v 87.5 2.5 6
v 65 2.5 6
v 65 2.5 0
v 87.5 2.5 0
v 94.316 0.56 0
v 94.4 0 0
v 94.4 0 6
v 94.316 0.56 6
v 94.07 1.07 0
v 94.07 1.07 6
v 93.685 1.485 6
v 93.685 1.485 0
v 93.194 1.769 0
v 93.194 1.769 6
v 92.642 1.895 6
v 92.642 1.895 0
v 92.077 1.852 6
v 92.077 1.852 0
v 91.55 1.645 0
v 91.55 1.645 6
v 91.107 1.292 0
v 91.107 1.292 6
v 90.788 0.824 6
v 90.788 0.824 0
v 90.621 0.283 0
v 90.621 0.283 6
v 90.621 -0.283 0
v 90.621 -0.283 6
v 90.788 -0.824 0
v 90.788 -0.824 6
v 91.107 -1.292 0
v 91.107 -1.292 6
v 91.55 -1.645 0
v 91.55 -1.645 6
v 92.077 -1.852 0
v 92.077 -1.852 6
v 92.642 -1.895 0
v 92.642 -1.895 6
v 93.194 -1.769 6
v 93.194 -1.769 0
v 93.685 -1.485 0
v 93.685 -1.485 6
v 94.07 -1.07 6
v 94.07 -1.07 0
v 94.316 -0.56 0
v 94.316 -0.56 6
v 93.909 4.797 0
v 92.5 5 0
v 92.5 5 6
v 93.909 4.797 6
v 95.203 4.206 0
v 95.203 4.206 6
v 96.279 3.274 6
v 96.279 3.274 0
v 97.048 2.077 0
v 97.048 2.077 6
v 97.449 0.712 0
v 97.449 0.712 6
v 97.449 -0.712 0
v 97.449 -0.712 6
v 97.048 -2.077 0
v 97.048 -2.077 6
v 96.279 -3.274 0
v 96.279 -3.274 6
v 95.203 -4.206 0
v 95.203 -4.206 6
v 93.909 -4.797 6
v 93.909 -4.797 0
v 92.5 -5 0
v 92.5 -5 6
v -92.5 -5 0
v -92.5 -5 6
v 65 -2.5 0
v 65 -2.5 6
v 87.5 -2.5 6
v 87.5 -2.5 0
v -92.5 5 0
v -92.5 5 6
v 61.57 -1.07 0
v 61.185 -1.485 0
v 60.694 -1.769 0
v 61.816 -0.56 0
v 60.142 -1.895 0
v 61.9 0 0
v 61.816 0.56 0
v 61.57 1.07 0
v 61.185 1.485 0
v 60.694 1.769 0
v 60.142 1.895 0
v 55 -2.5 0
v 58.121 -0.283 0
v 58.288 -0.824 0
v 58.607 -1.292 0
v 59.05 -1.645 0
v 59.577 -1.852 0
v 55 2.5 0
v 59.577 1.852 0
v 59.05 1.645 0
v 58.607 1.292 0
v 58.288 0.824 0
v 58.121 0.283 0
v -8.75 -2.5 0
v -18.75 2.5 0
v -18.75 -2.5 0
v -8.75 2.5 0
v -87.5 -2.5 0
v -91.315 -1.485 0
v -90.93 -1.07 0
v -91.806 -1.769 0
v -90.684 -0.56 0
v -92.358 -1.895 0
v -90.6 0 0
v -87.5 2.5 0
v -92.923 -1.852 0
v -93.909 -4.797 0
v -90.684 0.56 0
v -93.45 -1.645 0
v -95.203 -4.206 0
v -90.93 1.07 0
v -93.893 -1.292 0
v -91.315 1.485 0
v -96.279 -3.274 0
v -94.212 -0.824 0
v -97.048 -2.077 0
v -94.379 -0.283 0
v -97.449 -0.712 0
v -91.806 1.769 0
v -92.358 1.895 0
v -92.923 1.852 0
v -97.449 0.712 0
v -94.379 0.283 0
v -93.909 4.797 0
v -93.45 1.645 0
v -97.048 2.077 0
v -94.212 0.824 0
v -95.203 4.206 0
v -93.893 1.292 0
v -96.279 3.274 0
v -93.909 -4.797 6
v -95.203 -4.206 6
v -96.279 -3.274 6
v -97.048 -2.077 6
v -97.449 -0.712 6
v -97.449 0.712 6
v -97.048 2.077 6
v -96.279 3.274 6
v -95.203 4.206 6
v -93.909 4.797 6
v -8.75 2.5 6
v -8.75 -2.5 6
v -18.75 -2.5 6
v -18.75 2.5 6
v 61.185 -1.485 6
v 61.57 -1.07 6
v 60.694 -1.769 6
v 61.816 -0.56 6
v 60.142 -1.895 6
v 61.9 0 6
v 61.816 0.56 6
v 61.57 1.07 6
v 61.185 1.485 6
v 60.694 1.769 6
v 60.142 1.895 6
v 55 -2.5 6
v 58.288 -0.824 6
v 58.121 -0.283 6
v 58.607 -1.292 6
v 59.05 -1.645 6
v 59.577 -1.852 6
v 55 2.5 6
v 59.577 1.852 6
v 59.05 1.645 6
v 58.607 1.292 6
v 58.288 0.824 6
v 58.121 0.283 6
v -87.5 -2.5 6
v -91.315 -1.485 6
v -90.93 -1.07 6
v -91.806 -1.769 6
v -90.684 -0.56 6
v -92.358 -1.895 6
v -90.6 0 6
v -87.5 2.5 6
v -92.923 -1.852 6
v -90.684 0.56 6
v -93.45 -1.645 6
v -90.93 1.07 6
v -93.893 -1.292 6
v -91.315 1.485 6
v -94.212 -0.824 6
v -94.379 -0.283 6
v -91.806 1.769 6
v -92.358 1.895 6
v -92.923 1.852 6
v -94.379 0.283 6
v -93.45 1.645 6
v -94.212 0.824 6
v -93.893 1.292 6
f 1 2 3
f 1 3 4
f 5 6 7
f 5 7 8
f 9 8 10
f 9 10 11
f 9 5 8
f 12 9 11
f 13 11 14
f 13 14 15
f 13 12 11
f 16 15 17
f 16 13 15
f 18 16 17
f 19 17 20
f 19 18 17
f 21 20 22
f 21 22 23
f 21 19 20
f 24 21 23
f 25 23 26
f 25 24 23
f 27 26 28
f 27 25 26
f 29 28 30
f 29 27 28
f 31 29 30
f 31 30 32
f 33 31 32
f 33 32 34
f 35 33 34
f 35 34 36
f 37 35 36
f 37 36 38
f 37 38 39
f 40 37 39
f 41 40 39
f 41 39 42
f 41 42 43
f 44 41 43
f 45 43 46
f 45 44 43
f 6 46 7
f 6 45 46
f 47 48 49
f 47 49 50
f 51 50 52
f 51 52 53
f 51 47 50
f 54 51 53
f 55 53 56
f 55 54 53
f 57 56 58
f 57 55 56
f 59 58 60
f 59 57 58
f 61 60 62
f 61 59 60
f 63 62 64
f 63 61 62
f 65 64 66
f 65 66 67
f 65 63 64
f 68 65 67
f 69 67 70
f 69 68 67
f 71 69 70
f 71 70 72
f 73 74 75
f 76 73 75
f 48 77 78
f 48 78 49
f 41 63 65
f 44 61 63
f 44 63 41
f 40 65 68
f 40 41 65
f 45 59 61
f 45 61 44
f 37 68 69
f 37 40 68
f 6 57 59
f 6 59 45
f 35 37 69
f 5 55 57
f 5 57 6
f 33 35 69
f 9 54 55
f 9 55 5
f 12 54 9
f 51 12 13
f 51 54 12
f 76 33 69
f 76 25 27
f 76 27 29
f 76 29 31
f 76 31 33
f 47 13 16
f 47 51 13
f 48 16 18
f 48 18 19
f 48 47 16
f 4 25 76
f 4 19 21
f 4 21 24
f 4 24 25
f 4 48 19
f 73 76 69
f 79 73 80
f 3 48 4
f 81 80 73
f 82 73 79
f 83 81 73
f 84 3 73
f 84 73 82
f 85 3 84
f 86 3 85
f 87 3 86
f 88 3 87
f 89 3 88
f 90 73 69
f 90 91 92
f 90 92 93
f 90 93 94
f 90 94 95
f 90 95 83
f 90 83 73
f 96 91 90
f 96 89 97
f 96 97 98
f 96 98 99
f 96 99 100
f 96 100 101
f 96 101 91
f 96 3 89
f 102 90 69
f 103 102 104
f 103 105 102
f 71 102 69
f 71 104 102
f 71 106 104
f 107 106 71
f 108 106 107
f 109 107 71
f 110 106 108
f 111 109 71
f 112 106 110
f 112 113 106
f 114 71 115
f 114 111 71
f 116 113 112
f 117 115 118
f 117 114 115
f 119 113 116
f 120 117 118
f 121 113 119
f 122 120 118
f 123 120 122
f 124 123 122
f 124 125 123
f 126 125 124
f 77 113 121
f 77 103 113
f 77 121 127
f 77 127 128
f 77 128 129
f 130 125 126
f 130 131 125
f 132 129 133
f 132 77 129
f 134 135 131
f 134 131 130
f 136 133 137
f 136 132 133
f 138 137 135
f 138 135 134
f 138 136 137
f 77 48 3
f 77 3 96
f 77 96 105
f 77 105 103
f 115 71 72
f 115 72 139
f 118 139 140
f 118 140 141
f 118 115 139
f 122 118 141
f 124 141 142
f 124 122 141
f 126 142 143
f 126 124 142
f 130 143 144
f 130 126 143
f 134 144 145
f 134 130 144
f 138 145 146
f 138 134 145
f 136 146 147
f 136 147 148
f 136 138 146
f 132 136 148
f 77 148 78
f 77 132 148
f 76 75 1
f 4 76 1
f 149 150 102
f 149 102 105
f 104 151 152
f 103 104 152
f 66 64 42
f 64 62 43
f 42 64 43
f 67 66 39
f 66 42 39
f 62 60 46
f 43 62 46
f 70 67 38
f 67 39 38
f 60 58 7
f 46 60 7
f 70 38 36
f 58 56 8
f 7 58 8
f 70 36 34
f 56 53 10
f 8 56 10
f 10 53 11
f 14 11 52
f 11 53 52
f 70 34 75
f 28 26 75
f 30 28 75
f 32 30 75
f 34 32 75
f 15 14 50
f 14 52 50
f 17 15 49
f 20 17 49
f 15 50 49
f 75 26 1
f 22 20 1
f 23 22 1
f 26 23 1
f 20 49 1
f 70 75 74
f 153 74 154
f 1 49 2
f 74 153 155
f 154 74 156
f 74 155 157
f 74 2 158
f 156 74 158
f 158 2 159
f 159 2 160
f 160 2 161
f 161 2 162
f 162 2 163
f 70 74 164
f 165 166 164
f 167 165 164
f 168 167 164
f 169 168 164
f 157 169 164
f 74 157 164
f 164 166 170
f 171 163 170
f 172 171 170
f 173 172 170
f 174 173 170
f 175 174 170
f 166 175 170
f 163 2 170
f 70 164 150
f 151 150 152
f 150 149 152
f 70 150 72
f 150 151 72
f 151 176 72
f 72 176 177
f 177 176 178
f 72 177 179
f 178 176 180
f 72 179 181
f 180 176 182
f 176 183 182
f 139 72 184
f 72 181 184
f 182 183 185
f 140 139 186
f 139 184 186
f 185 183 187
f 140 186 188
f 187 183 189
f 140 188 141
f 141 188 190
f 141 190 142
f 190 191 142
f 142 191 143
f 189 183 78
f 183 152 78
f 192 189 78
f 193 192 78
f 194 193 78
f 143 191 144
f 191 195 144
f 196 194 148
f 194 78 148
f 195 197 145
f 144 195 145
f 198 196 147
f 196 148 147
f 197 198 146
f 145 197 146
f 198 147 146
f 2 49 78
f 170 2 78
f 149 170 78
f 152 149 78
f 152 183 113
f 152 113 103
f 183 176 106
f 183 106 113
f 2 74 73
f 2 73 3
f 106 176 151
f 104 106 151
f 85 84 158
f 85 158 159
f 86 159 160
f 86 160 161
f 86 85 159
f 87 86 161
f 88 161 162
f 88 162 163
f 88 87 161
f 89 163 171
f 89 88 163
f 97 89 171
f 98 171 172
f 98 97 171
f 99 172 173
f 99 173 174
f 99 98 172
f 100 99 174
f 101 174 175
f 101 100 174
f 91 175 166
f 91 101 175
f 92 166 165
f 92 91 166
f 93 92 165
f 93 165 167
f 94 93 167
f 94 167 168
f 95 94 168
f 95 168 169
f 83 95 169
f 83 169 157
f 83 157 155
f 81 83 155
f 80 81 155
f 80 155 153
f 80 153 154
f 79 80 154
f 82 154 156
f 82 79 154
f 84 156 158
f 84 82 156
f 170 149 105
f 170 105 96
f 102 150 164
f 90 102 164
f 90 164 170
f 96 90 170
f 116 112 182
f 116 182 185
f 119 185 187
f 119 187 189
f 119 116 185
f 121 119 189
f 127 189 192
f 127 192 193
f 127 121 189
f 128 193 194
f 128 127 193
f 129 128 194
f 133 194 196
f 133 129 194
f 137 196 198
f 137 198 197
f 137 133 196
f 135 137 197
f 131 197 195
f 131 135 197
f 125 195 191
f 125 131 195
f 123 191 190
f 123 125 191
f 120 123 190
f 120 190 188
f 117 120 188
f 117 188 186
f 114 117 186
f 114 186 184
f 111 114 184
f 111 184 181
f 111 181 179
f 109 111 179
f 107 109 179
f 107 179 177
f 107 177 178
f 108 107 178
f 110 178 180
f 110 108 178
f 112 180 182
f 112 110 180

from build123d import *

# Parameters (mm, degrees)
SKETCH1_R           = 1.9
BOSS_EXTRUDE1_DEPTH = 6
SKETCH2_W           = 142.5
SKETCH2_H           = 5
SKETCH2_W_2         = 22.5
CUT_EXTRUDE1_DEPTH  = 98.812320287
SKETCH3_W           = 10
SKETCH3_H           = 5
BOSS_EXTRUDE2_DEPTH = 6


with BuildPart() as part:
    # Sketch1 → Boss-Extrude1 (new body)
    with BuildSketch(Plane.XY):
        with BuildLine():
            Line((-92.5, 5), (92.5, 5))
            ThreePointArc((92.5, 5), (97.5, 0), (92.5, -5))
            Line((92.5, -5), (-92.5, -5))
            ThreePointArc((-92.5, -5), (-97.5, 0), (-92.5, 5))
        make_face()
        with Locations((-92.5, 0)):
            Circle(SKETCH1_R, mode=Mode.SUBTRACT)
        with Locations((92.5, 0)):
            Circle(SKETCH1_R, mode=Mode.SUBTRACT)
        with Locations((60, 0)):
            Circle(SKETCH1_R, mode=Mode.SUBTRACT)
    extrude(amount=BOSS_EXTRUDE1_DEPTH)

    # Sketch2 → Cut-Extrude1 (cut, through all)
    with BuildSketch(Plane.XY.offset(6)):
        with Locations((-16.25, 0)):
            Rectangle(SKETCH2_W, SKETCH2_H)
        with Locations((76.25, 0)):
            Rectangle(SKETCH2_W_2, SKETCH2_H)
    extrude(amount=-CUT_EXTRUDE1_DEPTH, mode=Mode.SUBTRACT)

    # Sketch3 → Boss-Extrude2 (add, through all)
    with BuildSketch(Plane.XY.offset(6)):
        with Locations((-13.75, 0)):
            Rectangle(SKETCH3_W, SKETCH3_H)
    extrude(amount=-BOSS_EXTRUDE2_DEPTH)


solid = part.part
